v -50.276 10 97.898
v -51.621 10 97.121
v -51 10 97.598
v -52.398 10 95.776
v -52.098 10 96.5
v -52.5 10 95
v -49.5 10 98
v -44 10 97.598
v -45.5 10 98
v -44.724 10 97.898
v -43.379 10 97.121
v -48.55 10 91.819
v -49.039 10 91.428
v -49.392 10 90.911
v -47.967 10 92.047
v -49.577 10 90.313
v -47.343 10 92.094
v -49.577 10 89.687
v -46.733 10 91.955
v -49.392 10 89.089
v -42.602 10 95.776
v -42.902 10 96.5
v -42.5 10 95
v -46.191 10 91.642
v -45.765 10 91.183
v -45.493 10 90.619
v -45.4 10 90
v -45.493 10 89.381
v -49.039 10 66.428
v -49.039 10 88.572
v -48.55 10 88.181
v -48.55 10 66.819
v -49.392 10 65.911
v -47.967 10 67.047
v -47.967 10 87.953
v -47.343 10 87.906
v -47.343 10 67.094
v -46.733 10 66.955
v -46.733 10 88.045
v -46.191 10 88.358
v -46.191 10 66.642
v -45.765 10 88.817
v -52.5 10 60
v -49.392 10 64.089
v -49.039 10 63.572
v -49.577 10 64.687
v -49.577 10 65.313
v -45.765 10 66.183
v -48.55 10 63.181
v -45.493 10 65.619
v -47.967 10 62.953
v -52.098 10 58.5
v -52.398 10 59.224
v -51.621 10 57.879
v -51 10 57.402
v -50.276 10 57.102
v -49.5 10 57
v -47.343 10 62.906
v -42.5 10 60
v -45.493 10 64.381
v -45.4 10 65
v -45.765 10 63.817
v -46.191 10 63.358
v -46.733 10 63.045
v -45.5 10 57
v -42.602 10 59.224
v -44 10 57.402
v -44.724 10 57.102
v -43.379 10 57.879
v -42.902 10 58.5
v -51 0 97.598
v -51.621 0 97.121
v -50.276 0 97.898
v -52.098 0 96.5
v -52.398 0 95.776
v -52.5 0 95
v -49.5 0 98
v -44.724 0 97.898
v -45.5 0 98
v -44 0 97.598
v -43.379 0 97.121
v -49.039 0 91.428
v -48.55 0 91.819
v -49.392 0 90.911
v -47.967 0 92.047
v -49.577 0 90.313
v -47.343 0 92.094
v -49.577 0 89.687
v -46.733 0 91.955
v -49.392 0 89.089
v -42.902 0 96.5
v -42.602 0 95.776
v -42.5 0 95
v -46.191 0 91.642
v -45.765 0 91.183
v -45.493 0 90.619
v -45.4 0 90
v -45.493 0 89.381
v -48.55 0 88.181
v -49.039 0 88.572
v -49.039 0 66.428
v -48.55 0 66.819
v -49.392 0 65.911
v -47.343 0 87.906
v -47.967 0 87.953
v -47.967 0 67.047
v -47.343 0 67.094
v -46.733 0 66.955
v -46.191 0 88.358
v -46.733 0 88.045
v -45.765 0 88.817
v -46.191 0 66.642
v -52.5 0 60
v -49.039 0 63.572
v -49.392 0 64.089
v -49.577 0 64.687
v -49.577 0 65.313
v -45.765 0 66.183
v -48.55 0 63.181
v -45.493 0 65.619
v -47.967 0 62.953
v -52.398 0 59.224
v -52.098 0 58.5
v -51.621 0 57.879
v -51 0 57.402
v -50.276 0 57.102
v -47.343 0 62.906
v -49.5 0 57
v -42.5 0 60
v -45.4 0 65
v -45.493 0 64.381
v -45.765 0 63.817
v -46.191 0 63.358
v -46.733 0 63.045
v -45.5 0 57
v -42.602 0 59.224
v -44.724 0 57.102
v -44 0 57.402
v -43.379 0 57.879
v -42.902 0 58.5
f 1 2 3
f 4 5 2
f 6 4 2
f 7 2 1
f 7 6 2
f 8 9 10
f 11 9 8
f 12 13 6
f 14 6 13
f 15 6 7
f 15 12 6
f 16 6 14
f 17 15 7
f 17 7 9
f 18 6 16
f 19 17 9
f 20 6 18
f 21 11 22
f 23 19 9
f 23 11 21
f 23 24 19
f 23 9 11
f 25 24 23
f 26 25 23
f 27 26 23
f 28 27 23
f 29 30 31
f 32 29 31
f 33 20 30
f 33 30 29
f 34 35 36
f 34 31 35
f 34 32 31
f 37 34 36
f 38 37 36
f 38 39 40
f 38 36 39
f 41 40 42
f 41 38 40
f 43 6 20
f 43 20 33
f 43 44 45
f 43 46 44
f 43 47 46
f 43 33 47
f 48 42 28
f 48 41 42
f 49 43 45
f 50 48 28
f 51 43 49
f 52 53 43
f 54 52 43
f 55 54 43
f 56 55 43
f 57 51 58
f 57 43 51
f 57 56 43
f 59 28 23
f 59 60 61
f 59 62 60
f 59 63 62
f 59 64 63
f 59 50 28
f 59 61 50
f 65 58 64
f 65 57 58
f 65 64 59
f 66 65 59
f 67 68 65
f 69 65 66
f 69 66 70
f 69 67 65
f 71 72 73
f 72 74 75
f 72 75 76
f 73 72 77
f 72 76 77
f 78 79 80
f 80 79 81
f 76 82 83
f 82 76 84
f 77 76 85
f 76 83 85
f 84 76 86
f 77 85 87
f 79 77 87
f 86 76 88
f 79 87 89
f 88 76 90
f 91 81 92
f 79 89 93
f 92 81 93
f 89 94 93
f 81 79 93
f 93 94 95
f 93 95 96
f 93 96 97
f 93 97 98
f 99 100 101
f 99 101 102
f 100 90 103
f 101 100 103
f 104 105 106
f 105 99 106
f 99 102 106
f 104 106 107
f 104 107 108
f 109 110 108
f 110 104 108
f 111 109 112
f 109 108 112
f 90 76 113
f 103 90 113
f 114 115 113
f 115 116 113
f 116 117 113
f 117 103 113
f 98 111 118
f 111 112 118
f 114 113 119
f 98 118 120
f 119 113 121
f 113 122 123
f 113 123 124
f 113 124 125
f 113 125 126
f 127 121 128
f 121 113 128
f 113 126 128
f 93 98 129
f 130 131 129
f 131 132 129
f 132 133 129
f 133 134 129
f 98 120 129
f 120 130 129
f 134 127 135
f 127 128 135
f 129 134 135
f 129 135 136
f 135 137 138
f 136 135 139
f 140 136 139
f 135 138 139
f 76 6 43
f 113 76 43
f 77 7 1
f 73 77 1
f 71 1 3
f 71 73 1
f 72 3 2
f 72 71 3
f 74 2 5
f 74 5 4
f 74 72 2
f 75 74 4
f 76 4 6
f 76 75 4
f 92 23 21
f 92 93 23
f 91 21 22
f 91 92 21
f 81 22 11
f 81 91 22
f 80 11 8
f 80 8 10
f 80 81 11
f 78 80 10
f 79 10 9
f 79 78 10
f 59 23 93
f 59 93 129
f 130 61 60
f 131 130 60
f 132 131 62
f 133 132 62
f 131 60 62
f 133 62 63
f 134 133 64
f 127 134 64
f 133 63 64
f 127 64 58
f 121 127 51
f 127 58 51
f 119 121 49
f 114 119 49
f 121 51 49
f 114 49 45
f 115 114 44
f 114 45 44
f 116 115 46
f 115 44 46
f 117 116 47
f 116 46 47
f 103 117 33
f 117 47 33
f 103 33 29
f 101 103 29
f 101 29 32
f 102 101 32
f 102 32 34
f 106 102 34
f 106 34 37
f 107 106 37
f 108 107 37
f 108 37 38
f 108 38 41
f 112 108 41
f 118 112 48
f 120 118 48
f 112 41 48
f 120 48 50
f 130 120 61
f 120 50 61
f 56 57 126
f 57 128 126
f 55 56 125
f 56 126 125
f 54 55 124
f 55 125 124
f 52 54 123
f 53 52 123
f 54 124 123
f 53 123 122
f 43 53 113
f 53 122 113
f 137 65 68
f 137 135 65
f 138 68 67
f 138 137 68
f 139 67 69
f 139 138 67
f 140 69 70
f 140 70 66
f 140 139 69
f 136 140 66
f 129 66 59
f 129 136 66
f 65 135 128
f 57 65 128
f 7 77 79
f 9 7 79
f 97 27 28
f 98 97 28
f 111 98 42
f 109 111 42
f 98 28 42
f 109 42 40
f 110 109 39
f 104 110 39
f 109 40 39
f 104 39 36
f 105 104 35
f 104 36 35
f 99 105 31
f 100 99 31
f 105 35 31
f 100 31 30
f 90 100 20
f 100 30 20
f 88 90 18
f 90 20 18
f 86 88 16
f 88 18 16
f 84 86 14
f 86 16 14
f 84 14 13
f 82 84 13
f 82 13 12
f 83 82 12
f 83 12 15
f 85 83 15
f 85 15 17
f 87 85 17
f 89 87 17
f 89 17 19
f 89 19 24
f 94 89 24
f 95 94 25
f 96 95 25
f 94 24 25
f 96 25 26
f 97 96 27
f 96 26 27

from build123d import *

# Parameters (mm, degrees)
SKETCH_1_W            = 55
SKETCH_1_H            = 32
SKETCH_1_R            = 2.1
EXTRUDE_1_DEPTH       = 10
SKETCH_2_W            = 55
SKETCH_2_H            = 4
EXTRUDE_2_DEPTH       = 10
SKETCH_4_R            = 2.1
SKETCH_4_R_2          = 1.6
EXTRUDE_3_DEPTH       = 10
SKETCH_6_R            = 2.1
EXTRUDE_4_DEPTH       = 10
SKETCH_7_W            = 15
SKETCH_7_H            = 11
CUT_EXTRUDE_1_DEPTH   = 11
EXTRUDE_5_DEPTH       = 10
SKETCH_9_R            = 1.5
CUT_EXTRUDE_2_DEPTH   = 11
SKETCH_10_OUTSIDE_W   = 301.892
SKETCH_10_OUTSIDE_H   = 218.392
SKETCH_10_OUTSIDE_W_2 = 10
SKETCH_10_OUTSIDE_H_2 = 41
CUT_EXTRUDE_3_DEPTH   = 11
FILLET_2_R            = 3


with BuildPart() as part:
    # 草图1 → 凸台-拉伸1 (new body)
    with BuildSketch(Plane(origin=(0, 0, 0), x_dir=(1, 0, 0), z_dir=(0, 1, 0))):
        Rectangle(SKETCH_1_W, SKETCH_1_H)
        with Locations((-12.5, 10)):
            Circle(SKETCH_1_R, mode=Mode.SUBTRACT)
        with Locations((12.5, 10)):
            Circle(SKETCH_1_R, mode=Mode.SUBTRACT)
        with Locations((12.5, -10)):
            Circle(SKETCH_1_R, mode=Mode.SUBTRACT)
        with Locations((-12.5, -10)):
            Circle(SKETCH_1_R, mode=Mode.SUBTRACT)
    extrude(amount=EXTRUDE_1_DEPTH)

    # 草图2 → 凸台-拉伸2 (add)
    with BuildSketch(Plane(origin=(0, 10, 0), x_dir=(1, 0, 0), z_dir=(0, 1, 0))):
        with Locations((0, -18)):
            Rectangle(SKETCH_2_W, SKETCH_2_H)
    extrude(amount=-EXTRUDE_2_DEPTH)

    # 草图4 → 凸台-拉伸3 (add)
    with BuildSketch(Plane(origin=(0, 10, 0), x_dir=(1, 0, 0), z_dir=(0, 1, 0))):
        Polygon((-27.5, -20), (-27.5, -57), (-67.5, -57), (-67.5, -98), (67.5, -98), (67.5, -57), (27.5, -57), (27.5, -20), align=None)
        with Locations((-47.5, -65)):
            Circle(SKETCH_4_R, mode=Mode.SUBTRACT)
        with Locations((-47.5, -90)):
            Circle(SKETCH_4_R, mode=Mode.SUBTRACT)
        with Locations((47.5, -90)):
            Circle(SKETCH_4_R, mode=Mode.SUBTRACT)
        with Locations((47.5, -65)):
            Circle(SKETCH_4_R, mode=Mode.SUBTRACT)
        with Locations((-62, -88)):
            Circle(SKETCH_4_R_2, mode=Mode.SUBTRACT)
        with Locations((-62, -80)):
            Circle(SKETCH_4_R_2, mode=Mode.SUBTRACT)
        with Locations((62, -88)):
            Circle(SKETCH_4_R_2, mode=Mode.SUBTRACT)
        with Locations((62, -80)):
            Circle(SKETCH_4_R_2, mode=Mode.SUBTRACT)
    extrude(amount=-EXTRUDE_3_DEPTH)

    # 草图6 → 凸台-拉伸4 (add)
    with BuildSketch(Plane(origin=(0, 10, 0), x_dir=(1, 0, 0), z_dir=(0, 1, 0))):
        Polygon((-121, -122.5), (-105, -122.5), (-83.215535743, -68), (-67.5, -68), (-67.5, -98), (-89, -142.5), (-121, -142.5), align=None)
        with Locations((-115, -127.5)):
            Circle(SKETCH_6_R, mode=Mode.SUBTRACT)
        with Locations((-95, -127.5)):
            Circle(SKETCH_6_R, mode=Mode.SUBTRACT)
        with Locations((-95, -137.5)):
            Circle(SKETCH_6_R, mode=Mode.SUBTRACT)
        with Locations((-115, -137.5)):
            Circle(SKETCH_6_R, mode=Mode.SUBTRACT)
        Polygon((67.5, -68), (83.215535743, -68), (105, -122.5), (121, -122.5), (121, -142.5), (89, -142.5), (67.5, -98), align=None)
        with Locations((115, -137.5)):
            Circle(SKETCH_6_R, mode=Mode.SUBTRACT)
        with Locations((95, -137.5)):
            Circle(SKETCH_6_R, mode=Mode.SUBTRACT)
        with Locations((95, -127.5)):
            Circle(SKETCH_6_R, mode=Mode.SUBTRACT)
        with Locations((115, -127.5)):
            Circle(SKETCH_6_R, mode=Mode.SUBTRACT)
    extrude(amount=-EXTRUDE_4_DEPTH)

    # 草图7 → 切除-拉伸1 (cut, through all)
    with BuildSketch(Plane(origin=(0, 10, 0), x_dir=(1, 0, 0), z_dir=(0, 1, 0))):
        with Locations((-60, -62.5)):
            Rectangle(SKETCH_7_W, SKETCH_7_H)
        with Locations((60, -62.5)):
            Rectangle(SKETCH_7_W, SKETCH_7_H)
    extrude(amount=-CUT_EXTRUDE_1_DEPTH, mode=Mode.SUBTRACT)

    # 草图8 → 凸台-拉伸5 (add)
    with BuildSketch(Plane(origin=(0, 10, 0), x_dir=(1, 0, 0), z_dir=(0, 1, 0))):
        Polygon((-27.5, -20), (-39.5, -57), (-27.5, -57), align=None)
        Polygon((39.5, -57), (27.5, -57), (27.5, -20), align=None)
    extrude(amount=-EXTRUDE_5_DEPTH)

    # 草图9 → 切除-拉伸2 (cut, through all)
    with BuildSketch(Plane(origin=(0, 10, 0), x_dir=(1, 0, 0), z_dir=(0, 1, 0))):
        with Locations((-30, -67)):
            Circle(SKETCH_9_R)
        with Locations((-15, -67)):
            Circle(SKETCH_9_R)
        with Locations((15, -67)):
            Circle(SKETCH_9_R)
        with Locations((30, -67)):
            Circle(SKETCH_9_R)
    extrude(amount=-CUT_EXTRUDE_2_DEPTH, mode=Mode.SUBTRACT)

    # 草图10 outside → 切除-拉伸3 (cut, through all)
    with BuildSketch(Plane(origin=(0, 10, 0), x_dir=(1, 0, 0), z_dir=(0, 1, 0))):
        with Locations((0, -63.25)):
            Rectangle(SKETCH_10_OUTSIDE_W, SKETCH_10_OUTSIDE_H)
        with Locations((-47.5, -77.5)):
            Rectangle(SKETCH_10_OUTSIDE_W_2, SKETCH_10_OUTSIDE_H_2, mode=Mode.SUBTRACT)
    extrude(amount=-CUT_EXTRUDE_3_DEPTH, mode=Mode.SUBTRACT)

    # 圆角2
    fillet_2_edges = [part.edges().sort_by_distance(p)[0] for p in [
        (-52.5, 5, 57),
        (-42.5, 5, 57),
        (-42.5, 5, 98),
        (-52.5, 5, 98),
    ]]
    fillet(fillet_2_edges, radius=FILLET_2_R)


solid = part.part
